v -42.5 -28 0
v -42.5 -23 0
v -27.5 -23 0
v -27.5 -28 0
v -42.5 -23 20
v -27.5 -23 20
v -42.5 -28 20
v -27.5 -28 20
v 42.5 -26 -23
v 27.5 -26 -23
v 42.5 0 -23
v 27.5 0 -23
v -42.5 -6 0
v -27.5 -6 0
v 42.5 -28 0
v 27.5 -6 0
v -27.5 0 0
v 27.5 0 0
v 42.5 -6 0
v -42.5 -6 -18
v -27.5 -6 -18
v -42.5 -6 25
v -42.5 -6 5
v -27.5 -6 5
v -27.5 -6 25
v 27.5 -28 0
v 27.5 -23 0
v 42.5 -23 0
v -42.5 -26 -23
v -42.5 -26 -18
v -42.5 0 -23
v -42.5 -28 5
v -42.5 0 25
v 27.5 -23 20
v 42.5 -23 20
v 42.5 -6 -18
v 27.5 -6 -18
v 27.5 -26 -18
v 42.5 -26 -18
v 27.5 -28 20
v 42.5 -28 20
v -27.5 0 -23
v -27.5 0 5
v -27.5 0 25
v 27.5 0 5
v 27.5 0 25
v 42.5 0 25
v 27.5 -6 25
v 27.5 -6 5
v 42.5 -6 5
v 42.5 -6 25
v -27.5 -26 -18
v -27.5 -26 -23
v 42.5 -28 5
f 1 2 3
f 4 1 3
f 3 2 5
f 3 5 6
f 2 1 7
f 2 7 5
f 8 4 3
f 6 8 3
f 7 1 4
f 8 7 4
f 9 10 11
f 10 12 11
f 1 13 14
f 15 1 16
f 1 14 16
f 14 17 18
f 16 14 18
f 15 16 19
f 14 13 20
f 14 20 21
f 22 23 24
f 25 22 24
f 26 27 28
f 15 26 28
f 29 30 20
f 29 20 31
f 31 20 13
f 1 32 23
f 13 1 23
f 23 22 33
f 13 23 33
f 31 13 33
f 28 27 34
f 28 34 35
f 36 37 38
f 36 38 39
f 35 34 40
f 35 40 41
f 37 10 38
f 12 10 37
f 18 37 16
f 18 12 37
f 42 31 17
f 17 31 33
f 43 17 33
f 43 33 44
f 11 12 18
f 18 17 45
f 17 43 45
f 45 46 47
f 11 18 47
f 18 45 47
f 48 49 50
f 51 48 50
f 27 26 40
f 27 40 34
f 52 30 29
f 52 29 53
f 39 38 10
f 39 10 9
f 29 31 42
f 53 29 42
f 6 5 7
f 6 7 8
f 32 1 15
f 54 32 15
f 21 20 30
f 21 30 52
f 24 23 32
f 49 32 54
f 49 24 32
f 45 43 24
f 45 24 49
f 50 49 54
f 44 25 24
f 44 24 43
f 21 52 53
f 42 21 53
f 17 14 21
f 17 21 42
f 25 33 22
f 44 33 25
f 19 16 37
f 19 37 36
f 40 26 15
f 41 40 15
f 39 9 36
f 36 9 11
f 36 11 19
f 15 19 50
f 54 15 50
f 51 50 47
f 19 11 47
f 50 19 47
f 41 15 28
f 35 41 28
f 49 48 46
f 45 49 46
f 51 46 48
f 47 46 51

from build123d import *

# Parameters (mm, degrees)
F0_W          = 15
F0_H          = 5
F0_W_2        = 55
F0_H_2        = 6
F0_H_3        = 17
F1_DEPTH      = 5
F2_DEPTH      = 20
F3_DEPTH      = 23
F3_DEPTH_BACK = 25
F4_W          = 15
F4_H          = 5
F5_DEPTH      = 20


with BuildPart() as f1:
    # F0 (on Top) → F1 (new body)
    with BuildSketch(Plane.XY):
        with Locations((-35, -25.5)):
            Rectangle(F0_W, F0_H)
        with Locations((0, -25.5)):
            Rectangle(F0_W_2, F0_H)
        with Locations((35, -25.5)):
            Rectangle(F0_W, F0_H)
        with Locations((35, -3)):
            Rectangle(F0_W, F0_H_2)
        with Locations((0, -3)):
            Rectangle(F0_W_2, F0_H_2)
        with Locations((-35, -3)):
            Rectangle(F0_W, F0_H_2)
        with Locations((-35, -14.5)):
            Rectangle(F0_W, F0_H_3)
        with Locations((0, -14.5)):
            Rectangle(F0_W_2, F0_H_3)
        with Locations((35, -14.5)):
            Rectangle(F0_W, F0_H_3)
    extrude(amount=F1_DEPTH)

    # F0 (on Top) → F3 (join, two sides)
    with BuildSketch(Plane.XY) as f3_sk:
        with Locations((-35, -3)):
            Rectangle(F0_W, F0_H_2)
        with Locations((35, -3)):
            Rectangle(F0_W, F0_H_2)
    extrude(amount=-F3_DEPTH)
    extrude(f3_sk.sketch, amount=F3_DEPTH_BACK)

    # F4 (on face) → F5 (join)
    with BuildSketch(Plane.XZ.offset(6)):
        with Locations((35, -20.5)):
            Rectangle(F4_W, F4_H)
        with Locations((-35, -20.5)):
            Rectangle(F4_W, F4_H)
    extrude(amount=F5_DEPTH)


with BuildPart() as f2:
    # F0 (on Top) → F2 (new body)
    with BuildSketch(Plane.XY):
        with Locations((-35, -25.5)):
            Rectangle(F0_W, F0_H)
    extrude(amount=F2_DEPTH)


with BuildPart() as f2b:
    # F0 (on Top) → F2, piece 2 (new body)
    with BuildSketch(Plane.XY):
        with Locations((35, -25.5)):
            Rectangle(F0_W, F0_H)
    extrude(amount=F2_DEPTH)


solid = Compound([f1.part, f2.part, f2b.part])
